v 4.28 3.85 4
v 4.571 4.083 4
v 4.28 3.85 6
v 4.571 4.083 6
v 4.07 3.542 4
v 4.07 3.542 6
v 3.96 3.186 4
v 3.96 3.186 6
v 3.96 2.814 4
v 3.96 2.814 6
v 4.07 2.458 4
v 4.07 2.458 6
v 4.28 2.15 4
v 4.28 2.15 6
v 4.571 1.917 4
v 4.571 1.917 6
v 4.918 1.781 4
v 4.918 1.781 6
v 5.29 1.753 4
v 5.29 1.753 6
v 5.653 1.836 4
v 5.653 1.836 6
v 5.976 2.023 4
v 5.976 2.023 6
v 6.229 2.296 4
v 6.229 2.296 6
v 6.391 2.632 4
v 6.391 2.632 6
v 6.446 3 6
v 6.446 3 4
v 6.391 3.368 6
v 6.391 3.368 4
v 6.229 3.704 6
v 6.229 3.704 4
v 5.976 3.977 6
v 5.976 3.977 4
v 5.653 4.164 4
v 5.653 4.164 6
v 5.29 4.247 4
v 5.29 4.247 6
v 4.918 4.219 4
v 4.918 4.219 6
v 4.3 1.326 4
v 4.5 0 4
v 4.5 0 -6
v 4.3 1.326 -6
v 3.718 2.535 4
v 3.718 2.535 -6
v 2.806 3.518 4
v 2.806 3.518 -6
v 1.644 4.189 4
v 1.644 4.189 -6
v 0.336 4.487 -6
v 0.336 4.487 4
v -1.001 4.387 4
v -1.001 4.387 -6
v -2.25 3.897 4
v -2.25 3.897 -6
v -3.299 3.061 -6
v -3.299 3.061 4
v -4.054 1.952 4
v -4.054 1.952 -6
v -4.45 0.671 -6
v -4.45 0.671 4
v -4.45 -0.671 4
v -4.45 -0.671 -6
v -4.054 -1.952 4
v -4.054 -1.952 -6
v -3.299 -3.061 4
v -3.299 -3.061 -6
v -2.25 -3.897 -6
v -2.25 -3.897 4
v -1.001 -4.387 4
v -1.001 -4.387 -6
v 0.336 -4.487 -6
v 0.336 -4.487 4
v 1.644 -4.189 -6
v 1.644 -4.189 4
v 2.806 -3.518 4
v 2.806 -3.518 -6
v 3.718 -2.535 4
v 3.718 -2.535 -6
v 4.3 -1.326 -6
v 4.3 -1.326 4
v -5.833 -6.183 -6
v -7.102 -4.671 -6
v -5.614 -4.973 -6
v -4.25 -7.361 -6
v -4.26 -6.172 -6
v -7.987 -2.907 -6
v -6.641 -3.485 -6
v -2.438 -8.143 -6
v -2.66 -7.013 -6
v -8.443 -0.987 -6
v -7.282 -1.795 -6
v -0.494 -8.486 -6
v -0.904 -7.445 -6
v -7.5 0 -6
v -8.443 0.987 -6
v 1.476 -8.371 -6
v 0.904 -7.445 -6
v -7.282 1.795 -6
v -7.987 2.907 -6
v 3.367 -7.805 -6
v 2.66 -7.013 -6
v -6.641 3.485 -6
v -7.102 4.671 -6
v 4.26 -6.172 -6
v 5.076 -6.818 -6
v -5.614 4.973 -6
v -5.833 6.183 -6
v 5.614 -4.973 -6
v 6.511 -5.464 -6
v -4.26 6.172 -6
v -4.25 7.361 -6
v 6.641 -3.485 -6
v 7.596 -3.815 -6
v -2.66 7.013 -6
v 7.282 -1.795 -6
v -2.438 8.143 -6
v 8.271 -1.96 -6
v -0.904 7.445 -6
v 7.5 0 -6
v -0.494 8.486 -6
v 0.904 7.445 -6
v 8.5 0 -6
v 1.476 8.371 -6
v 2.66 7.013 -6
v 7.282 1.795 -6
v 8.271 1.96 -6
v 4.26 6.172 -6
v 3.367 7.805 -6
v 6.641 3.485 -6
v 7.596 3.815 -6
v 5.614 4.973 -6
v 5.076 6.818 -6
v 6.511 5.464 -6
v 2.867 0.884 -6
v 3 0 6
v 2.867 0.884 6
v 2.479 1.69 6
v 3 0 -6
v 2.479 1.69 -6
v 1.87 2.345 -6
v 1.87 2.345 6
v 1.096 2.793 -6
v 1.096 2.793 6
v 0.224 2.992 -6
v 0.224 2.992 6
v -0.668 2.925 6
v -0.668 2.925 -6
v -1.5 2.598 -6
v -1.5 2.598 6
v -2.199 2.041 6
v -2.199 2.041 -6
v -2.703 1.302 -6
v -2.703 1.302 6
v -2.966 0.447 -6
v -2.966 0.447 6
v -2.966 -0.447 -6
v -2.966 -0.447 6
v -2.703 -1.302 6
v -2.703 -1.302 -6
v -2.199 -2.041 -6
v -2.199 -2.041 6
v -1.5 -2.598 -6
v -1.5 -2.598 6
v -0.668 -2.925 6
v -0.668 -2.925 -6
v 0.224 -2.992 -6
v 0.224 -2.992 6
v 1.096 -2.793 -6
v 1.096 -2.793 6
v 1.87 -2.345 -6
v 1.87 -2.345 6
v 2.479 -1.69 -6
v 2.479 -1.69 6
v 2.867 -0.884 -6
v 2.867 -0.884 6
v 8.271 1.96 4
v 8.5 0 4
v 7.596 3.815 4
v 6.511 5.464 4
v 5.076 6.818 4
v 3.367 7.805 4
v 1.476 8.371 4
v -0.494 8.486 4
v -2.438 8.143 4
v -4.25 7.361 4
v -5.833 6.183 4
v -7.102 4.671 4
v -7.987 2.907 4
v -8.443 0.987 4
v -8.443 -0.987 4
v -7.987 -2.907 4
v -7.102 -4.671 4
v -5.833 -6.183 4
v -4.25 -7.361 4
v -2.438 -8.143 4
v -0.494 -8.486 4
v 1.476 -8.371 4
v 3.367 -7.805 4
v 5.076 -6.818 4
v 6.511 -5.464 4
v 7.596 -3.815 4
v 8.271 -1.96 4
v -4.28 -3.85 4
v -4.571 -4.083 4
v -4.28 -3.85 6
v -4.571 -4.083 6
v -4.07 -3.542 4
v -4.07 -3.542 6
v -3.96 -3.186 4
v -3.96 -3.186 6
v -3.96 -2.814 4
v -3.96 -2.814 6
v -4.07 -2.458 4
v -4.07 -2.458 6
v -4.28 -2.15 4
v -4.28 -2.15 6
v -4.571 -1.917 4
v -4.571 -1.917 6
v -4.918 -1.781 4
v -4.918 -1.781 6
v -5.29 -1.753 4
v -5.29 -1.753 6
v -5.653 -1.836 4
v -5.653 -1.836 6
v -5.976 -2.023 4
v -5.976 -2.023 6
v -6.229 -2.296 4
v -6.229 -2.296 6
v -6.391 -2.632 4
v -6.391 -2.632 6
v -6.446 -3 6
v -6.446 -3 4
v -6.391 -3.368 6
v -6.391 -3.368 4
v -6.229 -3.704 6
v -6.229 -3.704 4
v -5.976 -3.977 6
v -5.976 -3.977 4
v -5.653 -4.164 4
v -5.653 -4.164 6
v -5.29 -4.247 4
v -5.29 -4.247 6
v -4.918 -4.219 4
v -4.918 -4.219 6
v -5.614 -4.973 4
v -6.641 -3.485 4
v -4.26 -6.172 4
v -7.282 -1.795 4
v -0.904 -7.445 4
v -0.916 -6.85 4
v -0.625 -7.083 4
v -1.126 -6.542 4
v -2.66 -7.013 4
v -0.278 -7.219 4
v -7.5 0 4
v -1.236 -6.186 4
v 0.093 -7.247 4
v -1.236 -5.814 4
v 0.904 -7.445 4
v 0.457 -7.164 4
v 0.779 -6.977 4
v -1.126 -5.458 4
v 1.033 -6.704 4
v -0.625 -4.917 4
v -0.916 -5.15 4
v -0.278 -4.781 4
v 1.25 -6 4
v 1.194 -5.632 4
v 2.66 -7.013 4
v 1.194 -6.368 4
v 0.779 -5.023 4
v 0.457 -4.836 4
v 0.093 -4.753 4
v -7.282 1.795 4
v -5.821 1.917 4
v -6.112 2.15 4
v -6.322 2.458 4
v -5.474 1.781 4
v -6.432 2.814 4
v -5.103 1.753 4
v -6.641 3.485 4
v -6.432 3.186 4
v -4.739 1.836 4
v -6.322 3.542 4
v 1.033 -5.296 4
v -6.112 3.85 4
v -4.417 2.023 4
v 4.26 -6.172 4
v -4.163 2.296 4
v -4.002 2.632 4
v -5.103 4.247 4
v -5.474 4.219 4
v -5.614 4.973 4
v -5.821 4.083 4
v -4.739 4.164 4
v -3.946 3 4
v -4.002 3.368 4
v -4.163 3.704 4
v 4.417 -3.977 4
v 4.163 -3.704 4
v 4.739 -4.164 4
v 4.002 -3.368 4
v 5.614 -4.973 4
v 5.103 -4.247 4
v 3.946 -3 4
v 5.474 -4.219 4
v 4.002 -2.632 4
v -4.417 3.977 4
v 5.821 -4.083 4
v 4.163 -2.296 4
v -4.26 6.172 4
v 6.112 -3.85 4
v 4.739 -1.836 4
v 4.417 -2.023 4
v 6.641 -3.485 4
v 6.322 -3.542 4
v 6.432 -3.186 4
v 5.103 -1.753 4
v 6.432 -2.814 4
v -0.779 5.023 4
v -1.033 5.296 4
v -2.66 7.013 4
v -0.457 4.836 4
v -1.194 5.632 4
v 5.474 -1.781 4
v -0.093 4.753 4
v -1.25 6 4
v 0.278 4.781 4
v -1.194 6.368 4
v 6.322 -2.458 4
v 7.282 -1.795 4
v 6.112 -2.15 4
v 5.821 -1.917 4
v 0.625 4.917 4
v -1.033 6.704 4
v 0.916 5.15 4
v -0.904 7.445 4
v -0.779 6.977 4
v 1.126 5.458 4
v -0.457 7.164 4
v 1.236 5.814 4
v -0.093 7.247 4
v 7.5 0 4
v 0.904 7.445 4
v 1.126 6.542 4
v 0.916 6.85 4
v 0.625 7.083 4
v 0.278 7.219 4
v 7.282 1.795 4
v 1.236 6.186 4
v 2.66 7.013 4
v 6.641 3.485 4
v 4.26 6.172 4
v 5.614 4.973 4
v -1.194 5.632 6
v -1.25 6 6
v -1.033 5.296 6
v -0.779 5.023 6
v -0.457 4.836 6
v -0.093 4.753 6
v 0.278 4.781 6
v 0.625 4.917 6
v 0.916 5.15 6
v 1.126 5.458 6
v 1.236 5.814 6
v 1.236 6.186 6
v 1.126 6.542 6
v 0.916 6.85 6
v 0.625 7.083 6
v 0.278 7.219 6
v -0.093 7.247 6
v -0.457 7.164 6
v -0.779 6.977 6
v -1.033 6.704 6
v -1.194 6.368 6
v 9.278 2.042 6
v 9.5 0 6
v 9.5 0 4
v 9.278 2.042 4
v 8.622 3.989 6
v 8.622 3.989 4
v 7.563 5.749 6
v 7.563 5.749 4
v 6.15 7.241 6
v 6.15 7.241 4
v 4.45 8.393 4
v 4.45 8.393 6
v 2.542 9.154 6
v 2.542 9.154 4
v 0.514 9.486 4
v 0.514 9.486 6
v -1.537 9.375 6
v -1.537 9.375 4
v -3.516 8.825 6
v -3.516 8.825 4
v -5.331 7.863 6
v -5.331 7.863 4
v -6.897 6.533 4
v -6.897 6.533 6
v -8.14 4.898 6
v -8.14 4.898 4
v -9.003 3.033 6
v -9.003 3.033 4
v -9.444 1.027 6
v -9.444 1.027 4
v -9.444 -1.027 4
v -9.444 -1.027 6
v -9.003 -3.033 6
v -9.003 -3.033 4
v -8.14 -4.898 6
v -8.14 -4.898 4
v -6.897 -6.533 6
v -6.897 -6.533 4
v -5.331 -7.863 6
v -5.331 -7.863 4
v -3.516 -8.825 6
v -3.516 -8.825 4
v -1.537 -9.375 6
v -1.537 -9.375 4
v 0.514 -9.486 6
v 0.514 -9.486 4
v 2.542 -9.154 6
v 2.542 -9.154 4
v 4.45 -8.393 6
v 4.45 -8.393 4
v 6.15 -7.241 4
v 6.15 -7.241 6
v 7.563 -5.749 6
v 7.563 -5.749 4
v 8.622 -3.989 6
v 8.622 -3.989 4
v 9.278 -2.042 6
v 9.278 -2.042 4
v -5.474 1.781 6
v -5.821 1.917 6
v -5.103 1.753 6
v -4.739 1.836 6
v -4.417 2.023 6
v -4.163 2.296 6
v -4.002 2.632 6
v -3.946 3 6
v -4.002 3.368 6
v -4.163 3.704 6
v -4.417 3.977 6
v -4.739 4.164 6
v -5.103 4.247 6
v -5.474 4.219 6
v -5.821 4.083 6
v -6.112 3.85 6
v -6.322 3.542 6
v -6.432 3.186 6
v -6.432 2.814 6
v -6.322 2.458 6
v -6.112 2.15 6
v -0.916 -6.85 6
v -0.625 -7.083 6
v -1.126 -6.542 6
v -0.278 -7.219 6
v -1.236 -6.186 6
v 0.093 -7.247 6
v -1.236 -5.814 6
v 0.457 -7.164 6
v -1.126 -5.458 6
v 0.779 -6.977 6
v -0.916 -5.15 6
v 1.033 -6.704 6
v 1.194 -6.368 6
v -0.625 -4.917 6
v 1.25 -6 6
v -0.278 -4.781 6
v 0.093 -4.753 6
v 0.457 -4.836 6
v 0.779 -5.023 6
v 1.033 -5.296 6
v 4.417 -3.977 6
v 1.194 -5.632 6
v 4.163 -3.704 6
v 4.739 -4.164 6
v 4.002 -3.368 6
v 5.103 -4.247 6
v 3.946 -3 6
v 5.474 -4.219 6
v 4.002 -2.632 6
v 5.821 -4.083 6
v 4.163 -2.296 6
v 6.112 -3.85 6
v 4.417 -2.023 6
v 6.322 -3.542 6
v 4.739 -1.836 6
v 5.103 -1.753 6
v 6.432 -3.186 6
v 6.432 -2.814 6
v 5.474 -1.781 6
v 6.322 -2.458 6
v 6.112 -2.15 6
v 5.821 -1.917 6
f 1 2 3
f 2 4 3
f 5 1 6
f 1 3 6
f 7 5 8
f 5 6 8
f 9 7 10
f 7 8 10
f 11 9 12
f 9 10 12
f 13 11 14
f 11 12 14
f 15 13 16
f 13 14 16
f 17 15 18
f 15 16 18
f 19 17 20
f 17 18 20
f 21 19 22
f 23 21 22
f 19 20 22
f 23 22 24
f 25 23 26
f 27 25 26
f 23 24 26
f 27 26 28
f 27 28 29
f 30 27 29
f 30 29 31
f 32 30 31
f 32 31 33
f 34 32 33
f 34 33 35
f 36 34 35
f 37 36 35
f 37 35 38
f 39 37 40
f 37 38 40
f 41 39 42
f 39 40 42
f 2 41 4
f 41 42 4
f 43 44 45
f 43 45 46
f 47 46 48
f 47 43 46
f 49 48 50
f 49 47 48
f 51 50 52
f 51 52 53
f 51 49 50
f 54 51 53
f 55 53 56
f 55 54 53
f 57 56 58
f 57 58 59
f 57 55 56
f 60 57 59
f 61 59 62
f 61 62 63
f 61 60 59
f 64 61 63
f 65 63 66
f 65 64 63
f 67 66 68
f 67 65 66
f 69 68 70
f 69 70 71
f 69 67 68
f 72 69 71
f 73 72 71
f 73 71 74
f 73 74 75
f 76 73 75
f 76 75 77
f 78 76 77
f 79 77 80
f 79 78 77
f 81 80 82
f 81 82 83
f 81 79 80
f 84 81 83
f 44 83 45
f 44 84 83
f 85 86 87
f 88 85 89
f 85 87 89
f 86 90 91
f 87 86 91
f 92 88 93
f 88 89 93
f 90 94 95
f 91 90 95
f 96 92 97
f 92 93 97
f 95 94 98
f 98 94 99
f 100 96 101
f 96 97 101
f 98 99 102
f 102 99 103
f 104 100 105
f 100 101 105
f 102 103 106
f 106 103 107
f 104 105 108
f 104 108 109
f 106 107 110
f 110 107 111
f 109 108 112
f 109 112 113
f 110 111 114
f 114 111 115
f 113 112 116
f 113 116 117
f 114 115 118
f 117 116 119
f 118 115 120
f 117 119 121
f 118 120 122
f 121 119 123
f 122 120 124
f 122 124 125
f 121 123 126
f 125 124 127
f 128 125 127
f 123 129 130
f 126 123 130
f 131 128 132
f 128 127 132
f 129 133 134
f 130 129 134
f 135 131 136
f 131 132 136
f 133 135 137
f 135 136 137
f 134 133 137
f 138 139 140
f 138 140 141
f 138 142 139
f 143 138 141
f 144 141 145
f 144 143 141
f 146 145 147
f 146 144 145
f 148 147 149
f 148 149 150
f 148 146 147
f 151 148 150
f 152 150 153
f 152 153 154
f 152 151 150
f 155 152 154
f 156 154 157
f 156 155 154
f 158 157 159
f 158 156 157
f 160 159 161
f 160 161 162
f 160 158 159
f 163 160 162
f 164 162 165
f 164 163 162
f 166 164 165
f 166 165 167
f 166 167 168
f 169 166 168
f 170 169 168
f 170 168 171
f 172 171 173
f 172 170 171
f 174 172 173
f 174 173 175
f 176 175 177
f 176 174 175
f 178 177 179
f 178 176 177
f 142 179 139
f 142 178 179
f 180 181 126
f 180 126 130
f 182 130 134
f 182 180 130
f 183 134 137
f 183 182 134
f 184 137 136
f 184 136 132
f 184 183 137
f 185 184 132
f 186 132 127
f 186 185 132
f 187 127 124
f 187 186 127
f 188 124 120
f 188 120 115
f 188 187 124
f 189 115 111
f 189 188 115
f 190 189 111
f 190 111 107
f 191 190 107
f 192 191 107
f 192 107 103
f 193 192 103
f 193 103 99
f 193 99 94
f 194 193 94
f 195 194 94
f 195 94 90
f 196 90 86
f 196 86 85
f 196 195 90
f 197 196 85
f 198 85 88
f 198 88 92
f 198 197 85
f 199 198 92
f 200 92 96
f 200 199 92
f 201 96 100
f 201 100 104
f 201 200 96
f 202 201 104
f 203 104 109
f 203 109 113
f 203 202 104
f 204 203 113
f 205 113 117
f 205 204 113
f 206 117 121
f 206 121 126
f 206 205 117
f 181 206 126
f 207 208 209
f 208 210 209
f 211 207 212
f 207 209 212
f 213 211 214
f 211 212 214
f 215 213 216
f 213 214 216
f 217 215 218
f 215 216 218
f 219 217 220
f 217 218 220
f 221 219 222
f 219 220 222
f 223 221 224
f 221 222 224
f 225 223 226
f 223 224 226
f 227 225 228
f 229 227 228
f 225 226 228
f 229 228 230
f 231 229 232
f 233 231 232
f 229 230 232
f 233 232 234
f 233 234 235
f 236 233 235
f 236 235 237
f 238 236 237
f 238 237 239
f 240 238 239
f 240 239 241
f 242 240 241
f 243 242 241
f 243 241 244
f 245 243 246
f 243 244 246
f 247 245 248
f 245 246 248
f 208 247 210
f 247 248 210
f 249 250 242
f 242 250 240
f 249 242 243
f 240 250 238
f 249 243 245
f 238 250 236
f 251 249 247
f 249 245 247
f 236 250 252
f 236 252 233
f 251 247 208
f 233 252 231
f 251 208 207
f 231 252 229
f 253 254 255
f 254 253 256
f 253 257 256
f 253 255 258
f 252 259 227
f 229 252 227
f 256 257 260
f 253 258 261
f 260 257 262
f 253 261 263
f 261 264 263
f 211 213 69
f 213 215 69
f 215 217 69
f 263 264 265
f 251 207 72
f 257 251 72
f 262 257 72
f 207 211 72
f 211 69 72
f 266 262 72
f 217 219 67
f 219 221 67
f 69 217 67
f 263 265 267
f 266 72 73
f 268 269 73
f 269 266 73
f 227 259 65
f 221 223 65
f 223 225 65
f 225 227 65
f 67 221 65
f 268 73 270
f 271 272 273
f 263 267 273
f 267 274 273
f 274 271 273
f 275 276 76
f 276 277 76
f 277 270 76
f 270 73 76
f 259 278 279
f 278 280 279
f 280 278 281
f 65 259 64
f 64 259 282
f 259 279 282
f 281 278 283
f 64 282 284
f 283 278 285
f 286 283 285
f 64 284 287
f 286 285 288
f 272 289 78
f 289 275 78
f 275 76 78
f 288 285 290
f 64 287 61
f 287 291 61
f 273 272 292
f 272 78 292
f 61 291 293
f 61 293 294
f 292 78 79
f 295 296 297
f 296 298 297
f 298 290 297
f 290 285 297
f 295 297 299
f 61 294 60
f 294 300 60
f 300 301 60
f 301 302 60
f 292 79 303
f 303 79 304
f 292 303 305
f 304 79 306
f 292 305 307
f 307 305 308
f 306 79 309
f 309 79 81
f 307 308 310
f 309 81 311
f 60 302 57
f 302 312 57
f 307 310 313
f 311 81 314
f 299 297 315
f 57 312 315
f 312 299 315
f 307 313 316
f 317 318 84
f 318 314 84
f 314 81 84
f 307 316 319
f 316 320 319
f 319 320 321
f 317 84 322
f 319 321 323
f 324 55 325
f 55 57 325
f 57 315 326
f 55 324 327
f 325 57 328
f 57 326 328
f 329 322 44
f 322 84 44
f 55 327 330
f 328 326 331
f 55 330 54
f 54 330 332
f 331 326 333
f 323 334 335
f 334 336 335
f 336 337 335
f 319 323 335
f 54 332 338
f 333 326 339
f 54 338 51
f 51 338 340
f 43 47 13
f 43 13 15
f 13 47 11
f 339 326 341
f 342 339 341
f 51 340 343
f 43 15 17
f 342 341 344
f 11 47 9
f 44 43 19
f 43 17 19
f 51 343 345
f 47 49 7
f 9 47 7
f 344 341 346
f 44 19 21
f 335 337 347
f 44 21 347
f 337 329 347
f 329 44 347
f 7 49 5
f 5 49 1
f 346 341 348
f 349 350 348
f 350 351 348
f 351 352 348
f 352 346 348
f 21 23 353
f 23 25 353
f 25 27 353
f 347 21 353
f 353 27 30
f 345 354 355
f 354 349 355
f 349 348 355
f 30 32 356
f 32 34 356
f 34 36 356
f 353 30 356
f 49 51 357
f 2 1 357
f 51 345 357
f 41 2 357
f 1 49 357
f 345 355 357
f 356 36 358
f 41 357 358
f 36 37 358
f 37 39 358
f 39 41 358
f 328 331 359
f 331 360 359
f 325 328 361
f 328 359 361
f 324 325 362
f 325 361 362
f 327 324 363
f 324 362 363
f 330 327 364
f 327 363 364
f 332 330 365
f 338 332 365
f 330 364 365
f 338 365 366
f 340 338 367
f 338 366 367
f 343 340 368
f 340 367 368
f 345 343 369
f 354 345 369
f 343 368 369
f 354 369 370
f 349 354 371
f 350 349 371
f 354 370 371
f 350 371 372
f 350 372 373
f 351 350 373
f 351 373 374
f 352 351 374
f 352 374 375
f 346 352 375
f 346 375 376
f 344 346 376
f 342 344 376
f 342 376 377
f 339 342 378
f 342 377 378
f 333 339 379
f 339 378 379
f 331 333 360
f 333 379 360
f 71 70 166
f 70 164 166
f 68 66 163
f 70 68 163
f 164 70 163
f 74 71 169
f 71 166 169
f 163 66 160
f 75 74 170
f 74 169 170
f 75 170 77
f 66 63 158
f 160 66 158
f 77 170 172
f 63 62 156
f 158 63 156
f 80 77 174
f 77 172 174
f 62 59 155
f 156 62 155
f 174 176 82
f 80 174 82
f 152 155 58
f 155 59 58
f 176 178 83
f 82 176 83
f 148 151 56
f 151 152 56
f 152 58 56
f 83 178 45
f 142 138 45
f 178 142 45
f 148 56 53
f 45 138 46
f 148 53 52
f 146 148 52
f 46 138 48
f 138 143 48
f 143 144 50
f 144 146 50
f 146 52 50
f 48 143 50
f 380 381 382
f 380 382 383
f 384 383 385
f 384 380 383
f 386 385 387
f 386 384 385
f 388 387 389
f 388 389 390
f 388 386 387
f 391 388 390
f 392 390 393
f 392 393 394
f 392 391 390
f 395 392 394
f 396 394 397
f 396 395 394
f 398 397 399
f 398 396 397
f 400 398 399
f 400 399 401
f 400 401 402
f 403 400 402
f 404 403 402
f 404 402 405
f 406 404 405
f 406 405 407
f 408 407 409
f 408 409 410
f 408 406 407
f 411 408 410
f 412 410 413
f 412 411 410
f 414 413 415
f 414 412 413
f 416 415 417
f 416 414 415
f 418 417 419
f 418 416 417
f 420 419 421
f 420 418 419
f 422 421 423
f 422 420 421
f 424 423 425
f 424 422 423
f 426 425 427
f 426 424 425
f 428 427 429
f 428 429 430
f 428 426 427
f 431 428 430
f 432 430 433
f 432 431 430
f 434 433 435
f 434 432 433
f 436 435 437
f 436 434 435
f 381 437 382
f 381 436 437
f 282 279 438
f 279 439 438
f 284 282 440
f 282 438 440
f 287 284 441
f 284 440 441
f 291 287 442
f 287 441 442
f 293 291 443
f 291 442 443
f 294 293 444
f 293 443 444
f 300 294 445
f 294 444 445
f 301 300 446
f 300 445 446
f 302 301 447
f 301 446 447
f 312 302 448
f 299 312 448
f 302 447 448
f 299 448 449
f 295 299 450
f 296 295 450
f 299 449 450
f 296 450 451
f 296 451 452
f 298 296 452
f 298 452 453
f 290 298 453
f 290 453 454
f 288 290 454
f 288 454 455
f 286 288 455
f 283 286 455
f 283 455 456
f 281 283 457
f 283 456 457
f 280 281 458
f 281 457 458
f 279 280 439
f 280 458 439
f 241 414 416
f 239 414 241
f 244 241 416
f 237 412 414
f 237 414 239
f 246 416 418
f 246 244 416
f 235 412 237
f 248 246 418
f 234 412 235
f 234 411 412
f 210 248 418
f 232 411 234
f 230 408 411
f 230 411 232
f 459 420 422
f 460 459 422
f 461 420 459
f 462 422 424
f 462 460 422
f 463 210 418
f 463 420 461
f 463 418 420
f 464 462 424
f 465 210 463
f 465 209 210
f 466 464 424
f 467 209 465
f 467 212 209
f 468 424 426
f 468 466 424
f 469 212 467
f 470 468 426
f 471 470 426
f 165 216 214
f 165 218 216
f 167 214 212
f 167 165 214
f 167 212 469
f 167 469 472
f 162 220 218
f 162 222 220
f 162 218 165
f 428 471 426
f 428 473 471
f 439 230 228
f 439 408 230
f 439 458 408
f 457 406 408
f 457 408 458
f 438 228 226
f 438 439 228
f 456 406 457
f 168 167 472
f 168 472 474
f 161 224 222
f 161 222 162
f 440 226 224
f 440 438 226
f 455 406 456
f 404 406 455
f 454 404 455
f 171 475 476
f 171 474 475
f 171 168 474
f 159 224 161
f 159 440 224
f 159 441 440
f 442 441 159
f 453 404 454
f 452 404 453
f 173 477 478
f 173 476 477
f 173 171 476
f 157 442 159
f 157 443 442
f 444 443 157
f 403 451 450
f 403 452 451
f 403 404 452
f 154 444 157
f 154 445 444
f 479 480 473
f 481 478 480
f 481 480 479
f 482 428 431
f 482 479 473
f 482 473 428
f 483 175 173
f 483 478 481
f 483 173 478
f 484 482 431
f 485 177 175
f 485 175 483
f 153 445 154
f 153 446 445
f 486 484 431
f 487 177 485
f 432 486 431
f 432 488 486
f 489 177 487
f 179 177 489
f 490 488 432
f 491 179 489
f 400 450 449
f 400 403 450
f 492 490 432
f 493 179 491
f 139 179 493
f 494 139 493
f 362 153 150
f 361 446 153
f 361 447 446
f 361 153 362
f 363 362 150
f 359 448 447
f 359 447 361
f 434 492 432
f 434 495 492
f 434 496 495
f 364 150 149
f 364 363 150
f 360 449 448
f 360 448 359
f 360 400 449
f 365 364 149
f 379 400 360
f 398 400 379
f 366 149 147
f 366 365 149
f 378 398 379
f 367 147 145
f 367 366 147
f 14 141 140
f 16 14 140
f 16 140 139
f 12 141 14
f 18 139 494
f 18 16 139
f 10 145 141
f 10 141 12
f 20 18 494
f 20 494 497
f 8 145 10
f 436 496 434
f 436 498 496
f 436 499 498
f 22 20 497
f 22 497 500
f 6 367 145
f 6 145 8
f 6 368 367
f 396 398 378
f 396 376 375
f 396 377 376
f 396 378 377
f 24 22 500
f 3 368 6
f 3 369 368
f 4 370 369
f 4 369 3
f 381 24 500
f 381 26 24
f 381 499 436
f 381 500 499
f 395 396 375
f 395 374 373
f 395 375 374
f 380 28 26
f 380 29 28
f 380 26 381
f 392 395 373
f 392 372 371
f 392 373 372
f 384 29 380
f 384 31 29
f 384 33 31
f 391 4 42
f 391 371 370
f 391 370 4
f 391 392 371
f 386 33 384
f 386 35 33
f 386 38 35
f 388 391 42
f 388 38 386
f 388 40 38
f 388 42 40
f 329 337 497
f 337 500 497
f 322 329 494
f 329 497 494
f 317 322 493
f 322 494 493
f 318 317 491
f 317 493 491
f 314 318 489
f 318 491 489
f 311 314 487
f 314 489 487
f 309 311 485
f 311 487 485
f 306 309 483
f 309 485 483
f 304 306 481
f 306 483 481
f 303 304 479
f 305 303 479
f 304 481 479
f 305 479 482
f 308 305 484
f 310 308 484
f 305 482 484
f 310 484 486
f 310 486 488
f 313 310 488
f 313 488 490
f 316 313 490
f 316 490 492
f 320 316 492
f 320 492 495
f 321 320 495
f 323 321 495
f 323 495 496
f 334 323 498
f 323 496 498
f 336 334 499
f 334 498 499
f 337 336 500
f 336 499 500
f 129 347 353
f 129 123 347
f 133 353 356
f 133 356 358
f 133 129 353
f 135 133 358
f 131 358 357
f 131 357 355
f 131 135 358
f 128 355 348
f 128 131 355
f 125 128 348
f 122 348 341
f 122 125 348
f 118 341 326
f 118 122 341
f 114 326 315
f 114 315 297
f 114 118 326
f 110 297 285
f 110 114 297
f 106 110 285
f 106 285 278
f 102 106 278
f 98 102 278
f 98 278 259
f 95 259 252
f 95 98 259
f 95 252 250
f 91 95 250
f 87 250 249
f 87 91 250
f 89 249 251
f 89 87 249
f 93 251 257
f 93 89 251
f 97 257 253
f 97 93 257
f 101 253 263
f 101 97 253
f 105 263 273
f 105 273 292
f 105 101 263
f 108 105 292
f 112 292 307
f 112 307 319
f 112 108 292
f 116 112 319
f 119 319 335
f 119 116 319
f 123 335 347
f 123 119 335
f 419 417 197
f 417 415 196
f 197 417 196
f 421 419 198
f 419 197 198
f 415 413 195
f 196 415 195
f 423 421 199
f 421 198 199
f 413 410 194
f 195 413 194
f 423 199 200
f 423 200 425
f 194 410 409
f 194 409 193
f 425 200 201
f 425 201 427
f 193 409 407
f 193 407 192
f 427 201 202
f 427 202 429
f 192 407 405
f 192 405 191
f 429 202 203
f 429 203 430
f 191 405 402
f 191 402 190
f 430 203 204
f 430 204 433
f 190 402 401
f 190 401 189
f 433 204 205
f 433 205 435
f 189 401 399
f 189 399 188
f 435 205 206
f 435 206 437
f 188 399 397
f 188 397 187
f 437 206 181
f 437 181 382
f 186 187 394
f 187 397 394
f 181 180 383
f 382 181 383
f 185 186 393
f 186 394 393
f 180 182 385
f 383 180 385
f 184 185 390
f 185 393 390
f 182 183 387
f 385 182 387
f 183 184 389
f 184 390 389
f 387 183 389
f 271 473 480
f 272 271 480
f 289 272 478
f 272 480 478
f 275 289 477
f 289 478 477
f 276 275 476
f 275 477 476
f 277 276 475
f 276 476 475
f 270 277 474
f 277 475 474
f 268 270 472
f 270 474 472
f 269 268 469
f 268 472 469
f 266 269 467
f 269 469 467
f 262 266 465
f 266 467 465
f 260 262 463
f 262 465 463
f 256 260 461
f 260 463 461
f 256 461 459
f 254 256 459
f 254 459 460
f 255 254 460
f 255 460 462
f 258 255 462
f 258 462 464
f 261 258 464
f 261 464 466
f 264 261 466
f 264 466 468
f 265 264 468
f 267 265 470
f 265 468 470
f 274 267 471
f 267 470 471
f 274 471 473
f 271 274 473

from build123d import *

# Parameters (mm, degrees)
SKETCH1_R             = 8.5
SKETCH1_R_2           = 7.5
BOSS_EXTRUDE1_DEPTH   = 6
SKETCH1_R_3           = 4.5
SKETCH1_R_4           = 3
BOSS_EXTRUDE1_2_DEPTH = 6
BOSS_EXTRUDE12_START  = 6
SKETCH1_4_R           = 9.5
SKETCH1_4_R_2         = 8.5
SKETCH1_4_R_3         = 7.5
SKETCH1_4_R_4         = 1.25
SKETCH1_4_R_5         = 4.5
BOSS_EXTRUDE12_DEPTH  = 2
SKETCH1_5_R           = 1.25
CUT_EXTRUDE2_DEPTH    = 7
CIRPATTERN1_COUNT     = 6


with BuildPart() as part:
    # Sketch1 → Boss-Extrude1 (new body, symmetric)
    with BuildSketch(Plane.XY):
        Circle(SKETCH1_R)
        Circle(SKETCH1_R_2, mode=Mode.SUBTRACT)
    extrude(amount=BOSS_EXTRUDE1_DEPTH, both=True)



with BuildPart() as body_2:
    # Sketch1 → Boss-Extrude1 2 (new body, symmetric)
    with BuildSketch(Plane.XY):
        Circle(SKETCH1_R_3)
        Circle(SKETCH1_R_4, mode=Mode.SUBTRACT)
    extrude(amount=BOSS_EXTRUDE1_2_DEPTH, both=True)


with BuildPart() as part_1:
    add(part.part)

    add(body_2.part)  # Boss-Extrude12 merges body 2
    # Sketch1<4> → Boss-Extrude12 (add)
    with BuildSketch(Plane.XY.offset(BOSS_EXTRUDE12_START)):
        Circle(SKETCH1_4_R)
        Circle(SKETCH1_4_R_2, mode=Mode.SUBTRACT)
        Circle(SKETCH1_4_R_3)
        with Locations((0, -6)):
            Circle(SKETCH1_4_R_4, mode=Mode.SUBTRACT)
        Circle(SKETCH1_4_R_5, mode=Mode.SUBTRACT)
    extrude(amount=-BOSS_EXTRUDE12_DEPTH)

    # Sketch1<5> → Cut-Extrude2 (cut, symmetric)
    with BuildSketch(Plane.XY):
        with Locations((0, -6)):
            Circle(SKETCH1_5_R)
    cut_extrude2 = extrude(amount=CUT_EXTRUDE2_DEPTH, both=True, mode=Mode.SUBTRACT)

    # CirPattern1: Cut-Extrude2 ×6 about axis
    cirpattern1_axis = Axis((0, 0, 0), (0, 0, 1))
    for i in range(1, CIRPATTERN1_COUNT):
        add(cut_extrude2.rotate(cirpattern1_axis, i * 360 / CIRPATTERN1_COUNT), mode=Mode.SUBTRACT)


solid = part_1.part
